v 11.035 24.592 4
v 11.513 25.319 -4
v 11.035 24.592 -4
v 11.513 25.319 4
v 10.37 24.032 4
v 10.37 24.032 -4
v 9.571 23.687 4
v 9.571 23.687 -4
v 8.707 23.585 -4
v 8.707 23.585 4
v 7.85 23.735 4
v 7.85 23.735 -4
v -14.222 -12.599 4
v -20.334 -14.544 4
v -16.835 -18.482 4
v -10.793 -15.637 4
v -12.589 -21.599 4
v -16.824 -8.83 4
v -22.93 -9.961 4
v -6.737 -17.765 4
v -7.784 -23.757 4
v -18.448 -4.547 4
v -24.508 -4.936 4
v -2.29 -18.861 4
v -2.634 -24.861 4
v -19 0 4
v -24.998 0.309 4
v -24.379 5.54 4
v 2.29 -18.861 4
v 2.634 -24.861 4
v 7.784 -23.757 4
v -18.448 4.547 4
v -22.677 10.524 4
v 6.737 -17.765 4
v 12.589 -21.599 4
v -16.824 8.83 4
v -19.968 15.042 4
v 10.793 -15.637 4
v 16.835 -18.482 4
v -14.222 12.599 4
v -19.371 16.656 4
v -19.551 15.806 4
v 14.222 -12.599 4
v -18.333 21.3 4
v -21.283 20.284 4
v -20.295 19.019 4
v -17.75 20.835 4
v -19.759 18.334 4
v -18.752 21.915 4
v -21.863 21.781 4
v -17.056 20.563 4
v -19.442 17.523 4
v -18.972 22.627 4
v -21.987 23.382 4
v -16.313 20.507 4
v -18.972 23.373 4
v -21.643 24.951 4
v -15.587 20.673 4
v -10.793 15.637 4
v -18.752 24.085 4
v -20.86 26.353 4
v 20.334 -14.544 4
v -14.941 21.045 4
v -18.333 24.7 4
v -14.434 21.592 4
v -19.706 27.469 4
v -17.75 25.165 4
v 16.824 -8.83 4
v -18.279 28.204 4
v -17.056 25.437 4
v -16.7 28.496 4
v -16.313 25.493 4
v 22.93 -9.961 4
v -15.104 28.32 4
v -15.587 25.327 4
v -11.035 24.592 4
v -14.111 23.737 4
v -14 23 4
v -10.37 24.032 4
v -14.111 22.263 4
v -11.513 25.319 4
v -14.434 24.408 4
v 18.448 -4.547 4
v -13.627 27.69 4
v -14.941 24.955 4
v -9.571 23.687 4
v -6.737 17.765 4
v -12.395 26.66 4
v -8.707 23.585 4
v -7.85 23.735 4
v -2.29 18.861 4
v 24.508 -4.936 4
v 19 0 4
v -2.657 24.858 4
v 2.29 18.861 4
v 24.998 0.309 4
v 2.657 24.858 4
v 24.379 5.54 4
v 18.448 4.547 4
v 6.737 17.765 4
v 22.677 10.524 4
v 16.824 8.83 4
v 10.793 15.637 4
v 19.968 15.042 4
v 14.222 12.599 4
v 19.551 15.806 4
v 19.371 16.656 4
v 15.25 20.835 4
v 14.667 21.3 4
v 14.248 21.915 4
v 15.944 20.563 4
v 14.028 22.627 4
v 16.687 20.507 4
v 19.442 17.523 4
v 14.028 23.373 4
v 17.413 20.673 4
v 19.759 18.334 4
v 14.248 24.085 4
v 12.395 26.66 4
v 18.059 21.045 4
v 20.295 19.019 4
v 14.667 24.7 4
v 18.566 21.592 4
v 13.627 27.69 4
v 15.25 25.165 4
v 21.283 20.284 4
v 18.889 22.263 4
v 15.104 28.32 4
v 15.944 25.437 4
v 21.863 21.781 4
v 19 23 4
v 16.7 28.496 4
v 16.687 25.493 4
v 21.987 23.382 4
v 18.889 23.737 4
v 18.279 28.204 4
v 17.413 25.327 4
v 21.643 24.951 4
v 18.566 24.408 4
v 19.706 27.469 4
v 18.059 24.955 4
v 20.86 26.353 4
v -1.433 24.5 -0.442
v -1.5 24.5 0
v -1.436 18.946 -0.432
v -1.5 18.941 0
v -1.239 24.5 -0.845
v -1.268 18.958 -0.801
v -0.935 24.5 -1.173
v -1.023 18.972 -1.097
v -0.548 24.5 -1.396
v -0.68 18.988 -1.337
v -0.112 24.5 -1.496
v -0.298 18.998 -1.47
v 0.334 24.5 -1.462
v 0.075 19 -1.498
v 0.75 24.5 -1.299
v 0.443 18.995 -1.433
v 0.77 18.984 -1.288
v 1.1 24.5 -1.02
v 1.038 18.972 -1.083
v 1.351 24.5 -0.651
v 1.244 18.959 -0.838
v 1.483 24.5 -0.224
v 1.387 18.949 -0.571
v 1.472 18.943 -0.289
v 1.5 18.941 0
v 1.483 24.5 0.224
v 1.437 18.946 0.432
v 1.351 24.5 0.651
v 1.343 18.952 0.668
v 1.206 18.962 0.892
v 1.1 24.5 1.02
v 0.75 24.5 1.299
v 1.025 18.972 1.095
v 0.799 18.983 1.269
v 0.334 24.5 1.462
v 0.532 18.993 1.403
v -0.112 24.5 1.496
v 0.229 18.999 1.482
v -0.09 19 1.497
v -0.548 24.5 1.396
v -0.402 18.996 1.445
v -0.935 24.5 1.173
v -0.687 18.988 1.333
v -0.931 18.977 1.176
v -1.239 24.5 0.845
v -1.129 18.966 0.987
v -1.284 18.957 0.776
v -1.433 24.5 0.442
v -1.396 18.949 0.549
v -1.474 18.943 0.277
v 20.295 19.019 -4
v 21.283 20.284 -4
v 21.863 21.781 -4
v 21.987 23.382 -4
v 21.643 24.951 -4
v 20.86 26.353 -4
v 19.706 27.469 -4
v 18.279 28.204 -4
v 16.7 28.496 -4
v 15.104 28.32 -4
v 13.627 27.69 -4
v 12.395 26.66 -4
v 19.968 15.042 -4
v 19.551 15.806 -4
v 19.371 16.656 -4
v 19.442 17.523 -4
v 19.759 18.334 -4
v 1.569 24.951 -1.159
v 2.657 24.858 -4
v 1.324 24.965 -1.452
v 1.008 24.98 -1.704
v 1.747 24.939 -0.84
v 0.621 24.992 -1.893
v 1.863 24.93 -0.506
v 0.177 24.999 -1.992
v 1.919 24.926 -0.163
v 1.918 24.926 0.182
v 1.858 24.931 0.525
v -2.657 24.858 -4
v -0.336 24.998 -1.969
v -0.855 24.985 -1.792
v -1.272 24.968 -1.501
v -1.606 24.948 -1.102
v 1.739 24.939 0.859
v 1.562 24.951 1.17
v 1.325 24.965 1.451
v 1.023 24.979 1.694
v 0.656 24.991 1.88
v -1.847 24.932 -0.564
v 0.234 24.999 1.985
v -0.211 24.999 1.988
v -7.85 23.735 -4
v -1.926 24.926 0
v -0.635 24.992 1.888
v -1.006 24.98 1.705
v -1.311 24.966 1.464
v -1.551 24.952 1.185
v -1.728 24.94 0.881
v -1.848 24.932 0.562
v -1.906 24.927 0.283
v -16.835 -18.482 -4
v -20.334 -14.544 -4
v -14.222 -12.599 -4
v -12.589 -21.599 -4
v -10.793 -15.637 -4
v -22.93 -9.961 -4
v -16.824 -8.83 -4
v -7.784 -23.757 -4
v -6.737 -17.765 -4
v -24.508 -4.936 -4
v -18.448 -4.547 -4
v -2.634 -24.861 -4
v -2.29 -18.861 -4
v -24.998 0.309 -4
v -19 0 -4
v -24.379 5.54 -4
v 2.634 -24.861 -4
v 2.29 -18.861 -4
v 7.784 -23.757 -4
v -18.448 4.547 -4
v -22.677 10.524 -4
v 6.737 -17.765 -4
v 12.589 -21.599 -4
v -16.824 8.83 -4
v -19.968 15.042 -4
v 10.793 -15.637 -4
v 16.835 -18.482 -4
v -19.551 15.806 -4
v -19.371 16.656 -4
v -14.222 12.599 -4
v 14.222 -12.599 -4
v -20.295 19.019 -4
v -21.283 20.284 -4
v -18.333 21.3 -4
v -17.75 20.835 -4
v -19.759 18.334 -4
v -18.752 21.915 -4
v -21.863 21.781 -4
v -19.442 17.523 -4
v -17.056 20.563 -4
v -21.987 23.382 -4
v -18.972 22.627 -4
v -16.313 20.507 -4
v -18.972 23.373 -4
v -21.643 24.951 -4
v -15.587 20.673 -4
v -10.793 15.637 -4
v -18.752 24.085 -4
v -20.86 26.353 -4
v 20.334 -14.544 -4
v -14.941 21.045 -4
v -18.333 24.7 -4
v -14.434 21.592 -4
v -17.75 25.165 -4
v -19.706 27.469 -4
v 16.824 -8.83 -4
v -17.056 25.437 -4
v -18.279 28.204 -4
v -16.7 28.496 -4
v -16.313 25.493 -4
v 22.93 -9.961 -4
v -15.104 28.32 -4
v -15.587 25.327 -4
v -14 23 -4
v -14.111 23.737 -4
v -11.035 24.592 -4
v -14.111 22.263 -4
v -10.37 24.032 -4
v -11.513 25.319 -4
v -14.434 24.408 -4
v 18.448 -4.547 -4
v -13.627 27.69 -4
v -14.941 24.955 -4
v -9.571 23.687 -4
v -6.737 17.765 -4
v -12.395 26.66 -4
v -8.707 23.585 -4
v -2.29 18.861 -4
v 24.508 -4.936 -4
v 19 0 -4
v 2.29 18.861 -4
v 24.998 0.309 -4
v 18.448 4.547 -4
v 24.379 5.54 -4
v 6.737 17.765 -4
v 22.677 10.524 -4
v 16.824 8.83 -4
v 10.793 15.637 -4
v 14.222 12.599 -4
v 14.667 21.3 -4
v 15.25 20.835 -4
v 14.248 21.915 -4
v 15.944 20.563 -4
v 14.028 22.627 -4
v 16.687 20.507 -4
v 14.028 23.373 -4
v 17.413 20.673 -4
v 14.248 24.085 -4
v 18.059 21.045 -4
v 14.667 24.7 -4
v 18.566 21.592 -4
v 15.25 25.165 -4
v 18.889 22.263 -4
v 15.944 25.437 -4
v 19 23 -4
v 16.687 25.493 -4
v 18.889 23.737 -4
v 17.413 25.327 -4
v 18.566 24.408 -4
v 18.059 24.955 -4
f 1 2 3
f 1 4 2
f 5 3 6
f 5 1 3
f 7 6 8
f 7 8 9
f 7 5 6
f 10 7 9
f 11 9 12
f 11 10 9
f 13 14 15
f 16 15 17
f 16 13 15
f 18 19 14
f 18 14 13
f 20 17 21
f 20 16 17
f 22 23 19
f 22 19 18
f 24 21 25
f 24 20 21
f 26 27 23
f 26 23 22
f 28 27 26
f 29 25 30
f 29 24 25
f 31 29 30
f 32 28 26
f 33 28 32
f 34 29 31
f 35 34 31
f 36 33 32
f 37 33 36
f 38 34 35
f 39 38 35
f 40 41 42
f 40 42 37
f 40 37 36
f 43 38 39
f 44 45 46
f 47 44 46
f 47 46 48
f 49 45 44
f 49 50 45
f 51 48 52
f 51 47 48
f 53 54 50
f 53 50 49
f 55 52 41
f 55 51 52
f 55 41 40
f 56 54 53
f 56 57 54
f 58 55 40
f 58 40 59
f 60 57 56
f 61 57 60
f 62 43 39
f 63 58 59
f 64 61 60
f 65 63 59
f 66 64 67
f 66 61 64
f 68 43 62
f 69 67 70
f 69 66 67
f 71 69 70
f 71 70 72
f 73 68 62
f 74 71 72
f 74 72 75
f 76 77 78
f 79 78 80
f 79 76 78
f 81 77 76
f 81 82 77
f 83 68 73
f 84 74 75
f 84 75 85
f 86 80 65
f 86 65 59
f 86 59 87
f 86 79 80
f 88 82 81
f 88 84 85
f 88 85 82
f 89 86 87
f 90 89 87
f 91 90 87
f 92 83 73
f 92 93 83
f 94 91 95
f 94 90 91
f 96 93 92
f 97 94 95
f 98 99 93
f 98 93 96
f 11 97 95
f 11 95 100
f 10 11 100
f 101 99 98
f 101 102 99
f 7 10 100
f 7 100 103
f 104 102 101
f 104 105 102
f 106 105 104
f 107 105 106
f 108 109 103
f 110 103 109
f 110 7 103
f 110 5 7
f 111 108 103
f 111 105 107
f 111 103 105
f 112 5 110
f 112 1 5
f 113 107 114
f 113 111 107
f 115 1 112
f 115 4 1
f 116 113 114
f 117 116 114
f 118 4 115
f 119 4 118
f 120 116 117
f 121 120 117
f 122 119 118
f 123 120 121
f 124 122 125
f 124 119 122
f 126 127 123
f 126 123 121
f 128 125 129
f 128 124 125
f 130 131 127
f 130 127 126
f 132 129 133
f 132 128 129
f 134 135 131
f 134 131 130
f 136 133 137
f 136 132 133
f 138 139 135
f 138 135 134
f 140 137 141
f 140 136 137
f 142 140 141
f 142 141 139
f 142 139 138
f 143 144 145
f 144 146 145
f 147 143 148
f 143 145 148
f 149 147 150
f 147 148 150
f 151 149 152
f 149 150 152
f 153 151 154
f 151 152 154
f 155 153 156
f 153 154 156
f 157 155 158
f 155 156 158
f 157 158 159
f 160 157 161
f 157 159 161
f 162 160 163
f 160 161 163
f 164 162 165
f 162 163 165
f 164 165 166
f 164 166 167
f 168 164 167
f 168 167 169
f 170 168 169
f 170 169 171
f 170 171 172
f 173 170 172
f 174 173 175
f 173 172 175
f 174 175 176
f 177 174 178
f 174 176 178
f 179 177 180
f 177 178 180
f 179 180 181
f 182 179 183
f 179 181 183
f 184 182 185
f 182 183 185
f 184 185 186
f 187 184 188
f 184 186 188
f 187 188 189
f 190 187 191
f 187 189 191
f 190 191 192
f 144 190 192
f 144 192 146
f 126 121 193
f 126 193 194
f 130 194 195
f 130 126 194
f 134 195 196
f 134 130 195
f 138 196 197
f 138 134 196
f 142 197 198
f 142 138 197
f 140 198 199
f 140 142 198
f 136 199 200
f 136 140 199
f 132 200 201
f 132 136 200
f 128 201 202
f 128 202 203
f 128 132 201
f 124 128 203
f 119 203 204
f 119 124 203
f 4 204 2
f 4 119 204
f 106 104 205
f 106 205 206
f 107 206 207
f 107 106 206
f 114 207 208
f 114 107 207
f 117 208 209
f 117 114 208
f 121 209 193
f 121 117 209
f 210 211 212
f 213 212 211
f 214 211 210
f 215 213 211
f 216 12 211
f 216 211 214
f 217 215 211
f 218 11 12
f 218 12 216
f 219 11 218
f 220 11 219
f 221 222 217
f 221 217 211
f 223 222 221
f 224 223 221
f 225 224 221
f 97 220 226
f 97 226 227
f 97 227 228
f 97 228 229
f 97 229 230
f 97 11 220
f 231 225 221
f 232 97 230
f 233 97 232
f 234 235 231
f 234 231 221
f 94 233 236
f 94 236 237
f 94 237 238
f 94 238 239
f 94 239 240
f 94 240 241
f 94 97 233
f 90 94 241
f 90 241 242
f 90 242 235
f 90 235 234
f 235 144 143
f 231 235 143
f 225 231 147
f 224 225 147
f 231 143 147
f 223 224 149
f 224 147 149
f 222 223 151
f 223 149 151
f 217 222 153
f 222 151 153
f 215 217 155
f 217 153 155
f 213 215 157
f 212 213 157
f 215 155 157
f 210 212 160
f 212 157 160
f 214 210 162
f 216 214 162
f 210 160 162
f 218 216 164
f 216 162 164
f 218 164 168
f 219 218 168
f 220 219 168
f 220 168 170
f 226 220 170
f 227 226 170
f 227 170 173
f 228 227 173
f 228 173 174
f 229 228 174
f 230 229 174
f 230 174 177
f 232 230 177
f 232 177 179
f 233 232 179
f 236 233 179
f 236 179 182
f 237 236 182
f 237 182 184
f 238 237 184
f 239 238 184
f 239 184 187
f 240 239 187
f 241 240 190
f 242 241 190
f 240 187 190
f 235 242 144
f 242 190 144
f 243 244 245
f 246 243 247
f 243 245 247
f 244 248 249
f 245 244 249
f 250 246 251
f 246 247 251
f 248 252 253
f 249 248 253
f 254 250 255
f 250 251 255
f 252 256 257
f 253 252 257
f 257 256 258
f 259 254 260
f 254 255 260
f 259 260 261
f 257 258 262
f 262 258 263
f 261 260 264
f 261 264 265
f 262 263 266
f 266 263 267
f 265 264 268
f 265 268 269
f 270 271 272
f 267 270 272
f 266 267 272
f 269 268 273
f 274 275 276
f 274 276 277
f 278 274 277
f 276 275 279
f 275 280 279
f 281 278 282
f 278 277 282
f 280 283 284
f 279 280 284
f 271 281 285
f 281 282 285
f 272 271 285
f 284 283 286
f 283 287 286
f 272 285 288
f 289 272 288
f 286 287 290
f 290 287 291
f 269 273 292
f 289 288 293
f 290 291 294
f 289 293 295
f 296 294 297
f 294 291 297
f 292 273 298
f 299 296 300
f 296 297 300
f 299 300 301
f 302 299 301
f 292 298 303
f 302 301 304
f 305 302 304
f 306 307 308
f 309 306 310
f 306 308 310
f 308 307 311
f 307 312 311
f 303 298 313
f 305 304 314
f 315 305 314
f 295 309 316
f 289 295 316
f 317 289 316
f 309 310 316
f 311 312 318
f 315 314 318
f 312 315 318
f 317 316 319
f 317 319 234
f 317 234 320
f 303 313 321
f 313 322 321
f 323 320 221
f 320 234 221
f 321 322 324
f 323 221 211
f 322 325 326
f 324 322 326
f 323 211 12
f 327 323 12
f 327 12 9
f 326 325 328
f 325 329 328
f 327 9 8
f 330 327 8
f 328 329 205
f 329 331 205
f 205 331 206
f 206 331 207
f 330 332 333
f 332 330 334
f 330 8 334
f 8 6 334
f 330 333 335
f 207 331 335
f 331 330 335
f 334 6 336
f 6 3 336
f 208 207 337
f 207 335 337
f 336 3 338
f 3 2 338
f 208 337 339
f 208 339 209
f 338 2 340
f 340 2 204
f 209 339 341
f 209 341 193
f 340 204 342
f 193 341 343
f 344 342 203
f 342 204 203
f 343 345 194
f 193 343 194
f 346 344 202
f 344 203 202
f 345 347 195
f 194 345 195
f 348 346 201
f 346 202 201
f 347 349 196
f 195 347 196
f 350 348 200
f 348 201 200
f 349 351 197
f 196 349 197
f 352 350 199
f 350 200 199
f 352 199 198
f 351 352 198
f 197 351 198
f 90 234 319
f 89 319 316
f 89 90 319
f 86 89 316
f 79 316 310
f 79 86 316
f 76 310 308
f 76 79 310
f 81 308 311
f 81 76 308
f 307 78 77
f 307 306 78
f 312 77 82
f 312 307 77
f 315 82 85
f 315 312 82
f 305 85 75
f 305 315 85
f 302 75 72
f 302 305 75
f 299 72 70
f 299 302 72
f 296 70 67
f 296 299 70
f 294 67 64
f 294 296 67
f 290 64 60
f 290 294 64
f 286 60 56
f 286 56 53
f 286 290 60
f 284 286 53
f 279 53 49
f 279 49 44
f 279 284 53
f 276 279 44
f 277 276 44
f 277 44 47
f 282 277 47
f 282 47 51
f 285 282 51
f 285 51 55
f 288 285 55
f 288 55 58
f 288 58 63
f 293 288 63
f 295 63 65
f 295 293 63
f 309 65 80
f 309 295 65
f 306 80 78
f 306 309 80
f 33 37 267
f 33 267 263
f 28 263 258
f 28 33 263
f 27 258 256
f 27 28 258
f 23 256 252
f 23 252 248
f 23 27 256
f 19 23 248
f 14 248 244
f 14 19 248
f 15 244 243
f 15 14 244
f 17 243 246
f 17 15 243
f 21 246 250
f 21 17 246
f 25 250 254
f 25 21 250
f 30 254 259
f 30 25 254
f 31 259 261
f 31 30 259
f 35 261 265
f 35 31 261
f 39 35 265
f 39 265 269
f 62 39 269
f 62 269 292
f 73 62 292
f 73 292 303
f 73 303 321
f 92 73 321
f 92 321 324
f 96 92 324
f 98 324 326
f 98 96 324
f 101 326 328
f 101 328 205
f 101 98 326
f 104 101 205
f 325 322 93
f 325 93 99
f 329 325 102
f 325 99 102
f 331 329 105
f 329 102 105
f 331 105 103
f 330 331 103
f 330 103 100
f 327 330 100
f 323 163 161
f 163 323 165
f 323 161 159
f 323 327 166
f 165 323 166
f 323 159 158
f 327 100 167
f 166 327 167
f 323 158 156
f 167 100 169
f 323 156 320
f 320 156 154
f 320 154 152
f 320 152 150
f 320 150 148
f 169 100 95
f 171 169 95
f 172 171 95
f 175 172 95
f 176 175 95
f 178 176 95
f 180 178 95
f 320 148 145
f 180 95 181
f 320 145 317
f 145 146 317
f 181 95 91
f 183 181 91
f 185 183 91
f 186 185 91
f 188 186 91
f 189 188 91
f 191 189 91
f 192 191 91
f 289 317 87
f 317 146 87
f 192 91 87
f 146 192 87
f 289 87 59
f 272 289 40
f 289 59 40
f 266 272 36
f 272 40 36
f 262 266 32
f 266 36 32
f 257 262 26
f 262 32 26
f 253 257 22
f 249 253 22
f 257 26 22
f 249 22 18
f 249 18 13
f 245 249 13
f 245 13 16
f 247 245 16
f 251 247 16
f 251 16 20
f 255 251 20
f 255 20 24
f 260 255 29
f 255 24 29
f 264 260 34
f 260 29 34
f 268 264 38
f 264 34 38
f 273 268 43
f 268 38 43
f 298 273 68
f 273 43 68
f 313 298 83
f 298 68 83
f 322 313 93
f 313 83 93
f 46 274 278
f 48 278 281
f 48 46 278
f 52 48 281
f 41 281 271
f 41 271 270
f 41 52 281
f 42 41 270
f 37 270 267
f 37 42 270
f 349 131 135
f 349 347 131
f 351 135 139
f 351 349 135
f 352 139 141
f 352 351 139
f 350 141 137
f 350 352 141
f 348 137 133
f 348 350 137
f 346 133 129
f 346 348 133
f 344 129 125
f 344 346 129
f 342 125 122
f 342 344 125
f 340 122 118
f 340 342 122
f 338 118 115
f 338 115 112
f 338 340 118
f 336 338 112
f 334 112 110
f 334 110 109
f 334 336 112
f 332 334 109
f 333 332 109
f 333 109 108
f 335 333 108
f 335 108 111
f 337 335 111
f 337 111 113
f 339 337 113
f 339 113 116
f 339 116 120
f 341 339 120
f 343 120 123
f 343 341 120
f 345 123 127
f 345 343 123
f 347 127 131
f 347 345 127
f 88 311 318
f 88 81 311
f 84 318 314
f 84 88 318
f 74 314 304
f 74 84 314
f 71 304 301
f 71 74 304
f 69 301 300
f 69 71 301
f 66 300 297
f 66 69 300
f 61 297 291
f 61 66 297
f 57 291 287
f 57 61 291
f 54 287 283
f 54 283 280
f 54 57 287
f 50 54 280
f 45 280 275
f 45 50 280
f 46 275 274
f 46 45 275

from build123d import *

# Parameters (mm, degrees)
BOSS_EXTRUDE1_DEPTH                                  = 4
BOSS_EXTRUDE1_DEPTH_BACK                             = 4
SKETCH1_R                                            = 19
SKETCH1_R_2                                          = 2.5
CSK_FOR_ST2_2_CROSS_RECESSED_CTSK_HEAD_T_D           = 3
CSK_FOR_ST2_2_CROSS_RECESSED_CTSK_HEAD_T_DEPTH       = 10.1
CSK_FOR_ST2_2_CROSS_RECESSED_CTSK_HEAD_T_CSINK_D     = 4
CSK_FOR_ST2_2_CROSS_RECESSED_CTSK_HEAD_T_CSINK_ANGLE = 90
CSK_FOR_ST2_2_CROSS_RECESSED_CTSK_HEAD_T_TIP         = 0.901290929


with BuildPart() as part:
    # Sketch1 → Boss-Extrude1 (new, two sides: drawn at the far end of the back side and taken through both)
    with BuildSketch(Plane.XY.offset(-BOSS_EXTRUDE1_DEPTH_BACK)):
        with BuildLine():
            ThreePointArc((19.968337429, 15.042124196), (19.37459007, 17.09256497), (20.294700731, 19.018763212))
            ThreePointArc((20.294700731, 19.018763212), (19.705993339, 27.468960361), (11.512732462, 25.318870955))
            ThreePointArc((11.512732462, 25.318870955), (9.982940481, 23.830053075), (7.850361432, 23.735455028))
            ThreePointArc((7.850361432, 23.735455028), (4.5e-08, 25), (-7.850361347, 23.735455056))
            ThreePointArc((-7.850361347, 23.735455056), (-9.982940439, 23.830053057), (-11.512732462, 25.318870955))
            ThreePointArc((-11.512732462, 25.318870955), (-19.705993339, 27.468960361), (-20.294700731, 19.018763212))
            ThreePointArc((-20.294700731, 19.018763212), (-19.374590067, 17.092564941), (-19.968337465, 15.042124148))
            ThreePointArc((-19.968337465, 15.042124148), (3e-08, -25), (19.968337429, 15.042124196))
        make_face()
        Circle(SKETCH1_R, mode=Mode.SUBTRACT)
        with Locations((16.5, 23)):
            Circle(SKETCH1_R_2, mode=Mode.SUBTRACT)
        with Locations((-16.5, 23)):
            Circle(SKETCH1_R_2, mode=Mode.SUBTRACT)
    extrude(amount=BOSS_EXTRUDE1_DEPTH + BOSS_EXTRUDE1_DEPTH_BACK)

    # CSK for ST2.2 Cross recessed CTSK head tapping screws1
    with Locations(Plane(origin=(0, 25, 0), x_dir=(1, 0, 0), z_dir=(0, 1, 0))):
        with Locations((0, 0)):
            CounterSinkHole(CSK_FOR_ST2_2_CROSS_RECESSED_CTSK_HEAD_T_D / 2, CSK_FOR_ST2_2_CROSS_RECESSED_CTSK_HEAD_T_CSINK_D / 2, depth=CSK_FOR_ST2_2_CROSS_RECESSED_CTSK_HEAD_T_DEPTH, counter_sink_angle=CSK_FOR_ST2_2_CROSS_RECESSED_CTSK_HEAD_T_CSINK_ANGLE)
            with Locations((0, 0, -(CSK_FOR_ST2_2_CROSS_RECESSED_CTSK_HEAD_T_DEPTH + CSK_FOR_ST2_2_CROSS_RECESSED_CTSK_HEAD_T_TIP / 2))):  # 118° drill point
                Cone(0, CSK_FOR_ST2_2_CROSS_RECESSED_CTSK_HEAD_T_D / 2, CSK_FOR_ST2_2_CROSS_RECESSED_CTSK_HEAD_T_TIP, mode=Mode.SUBTRACT)


solid = part.part
